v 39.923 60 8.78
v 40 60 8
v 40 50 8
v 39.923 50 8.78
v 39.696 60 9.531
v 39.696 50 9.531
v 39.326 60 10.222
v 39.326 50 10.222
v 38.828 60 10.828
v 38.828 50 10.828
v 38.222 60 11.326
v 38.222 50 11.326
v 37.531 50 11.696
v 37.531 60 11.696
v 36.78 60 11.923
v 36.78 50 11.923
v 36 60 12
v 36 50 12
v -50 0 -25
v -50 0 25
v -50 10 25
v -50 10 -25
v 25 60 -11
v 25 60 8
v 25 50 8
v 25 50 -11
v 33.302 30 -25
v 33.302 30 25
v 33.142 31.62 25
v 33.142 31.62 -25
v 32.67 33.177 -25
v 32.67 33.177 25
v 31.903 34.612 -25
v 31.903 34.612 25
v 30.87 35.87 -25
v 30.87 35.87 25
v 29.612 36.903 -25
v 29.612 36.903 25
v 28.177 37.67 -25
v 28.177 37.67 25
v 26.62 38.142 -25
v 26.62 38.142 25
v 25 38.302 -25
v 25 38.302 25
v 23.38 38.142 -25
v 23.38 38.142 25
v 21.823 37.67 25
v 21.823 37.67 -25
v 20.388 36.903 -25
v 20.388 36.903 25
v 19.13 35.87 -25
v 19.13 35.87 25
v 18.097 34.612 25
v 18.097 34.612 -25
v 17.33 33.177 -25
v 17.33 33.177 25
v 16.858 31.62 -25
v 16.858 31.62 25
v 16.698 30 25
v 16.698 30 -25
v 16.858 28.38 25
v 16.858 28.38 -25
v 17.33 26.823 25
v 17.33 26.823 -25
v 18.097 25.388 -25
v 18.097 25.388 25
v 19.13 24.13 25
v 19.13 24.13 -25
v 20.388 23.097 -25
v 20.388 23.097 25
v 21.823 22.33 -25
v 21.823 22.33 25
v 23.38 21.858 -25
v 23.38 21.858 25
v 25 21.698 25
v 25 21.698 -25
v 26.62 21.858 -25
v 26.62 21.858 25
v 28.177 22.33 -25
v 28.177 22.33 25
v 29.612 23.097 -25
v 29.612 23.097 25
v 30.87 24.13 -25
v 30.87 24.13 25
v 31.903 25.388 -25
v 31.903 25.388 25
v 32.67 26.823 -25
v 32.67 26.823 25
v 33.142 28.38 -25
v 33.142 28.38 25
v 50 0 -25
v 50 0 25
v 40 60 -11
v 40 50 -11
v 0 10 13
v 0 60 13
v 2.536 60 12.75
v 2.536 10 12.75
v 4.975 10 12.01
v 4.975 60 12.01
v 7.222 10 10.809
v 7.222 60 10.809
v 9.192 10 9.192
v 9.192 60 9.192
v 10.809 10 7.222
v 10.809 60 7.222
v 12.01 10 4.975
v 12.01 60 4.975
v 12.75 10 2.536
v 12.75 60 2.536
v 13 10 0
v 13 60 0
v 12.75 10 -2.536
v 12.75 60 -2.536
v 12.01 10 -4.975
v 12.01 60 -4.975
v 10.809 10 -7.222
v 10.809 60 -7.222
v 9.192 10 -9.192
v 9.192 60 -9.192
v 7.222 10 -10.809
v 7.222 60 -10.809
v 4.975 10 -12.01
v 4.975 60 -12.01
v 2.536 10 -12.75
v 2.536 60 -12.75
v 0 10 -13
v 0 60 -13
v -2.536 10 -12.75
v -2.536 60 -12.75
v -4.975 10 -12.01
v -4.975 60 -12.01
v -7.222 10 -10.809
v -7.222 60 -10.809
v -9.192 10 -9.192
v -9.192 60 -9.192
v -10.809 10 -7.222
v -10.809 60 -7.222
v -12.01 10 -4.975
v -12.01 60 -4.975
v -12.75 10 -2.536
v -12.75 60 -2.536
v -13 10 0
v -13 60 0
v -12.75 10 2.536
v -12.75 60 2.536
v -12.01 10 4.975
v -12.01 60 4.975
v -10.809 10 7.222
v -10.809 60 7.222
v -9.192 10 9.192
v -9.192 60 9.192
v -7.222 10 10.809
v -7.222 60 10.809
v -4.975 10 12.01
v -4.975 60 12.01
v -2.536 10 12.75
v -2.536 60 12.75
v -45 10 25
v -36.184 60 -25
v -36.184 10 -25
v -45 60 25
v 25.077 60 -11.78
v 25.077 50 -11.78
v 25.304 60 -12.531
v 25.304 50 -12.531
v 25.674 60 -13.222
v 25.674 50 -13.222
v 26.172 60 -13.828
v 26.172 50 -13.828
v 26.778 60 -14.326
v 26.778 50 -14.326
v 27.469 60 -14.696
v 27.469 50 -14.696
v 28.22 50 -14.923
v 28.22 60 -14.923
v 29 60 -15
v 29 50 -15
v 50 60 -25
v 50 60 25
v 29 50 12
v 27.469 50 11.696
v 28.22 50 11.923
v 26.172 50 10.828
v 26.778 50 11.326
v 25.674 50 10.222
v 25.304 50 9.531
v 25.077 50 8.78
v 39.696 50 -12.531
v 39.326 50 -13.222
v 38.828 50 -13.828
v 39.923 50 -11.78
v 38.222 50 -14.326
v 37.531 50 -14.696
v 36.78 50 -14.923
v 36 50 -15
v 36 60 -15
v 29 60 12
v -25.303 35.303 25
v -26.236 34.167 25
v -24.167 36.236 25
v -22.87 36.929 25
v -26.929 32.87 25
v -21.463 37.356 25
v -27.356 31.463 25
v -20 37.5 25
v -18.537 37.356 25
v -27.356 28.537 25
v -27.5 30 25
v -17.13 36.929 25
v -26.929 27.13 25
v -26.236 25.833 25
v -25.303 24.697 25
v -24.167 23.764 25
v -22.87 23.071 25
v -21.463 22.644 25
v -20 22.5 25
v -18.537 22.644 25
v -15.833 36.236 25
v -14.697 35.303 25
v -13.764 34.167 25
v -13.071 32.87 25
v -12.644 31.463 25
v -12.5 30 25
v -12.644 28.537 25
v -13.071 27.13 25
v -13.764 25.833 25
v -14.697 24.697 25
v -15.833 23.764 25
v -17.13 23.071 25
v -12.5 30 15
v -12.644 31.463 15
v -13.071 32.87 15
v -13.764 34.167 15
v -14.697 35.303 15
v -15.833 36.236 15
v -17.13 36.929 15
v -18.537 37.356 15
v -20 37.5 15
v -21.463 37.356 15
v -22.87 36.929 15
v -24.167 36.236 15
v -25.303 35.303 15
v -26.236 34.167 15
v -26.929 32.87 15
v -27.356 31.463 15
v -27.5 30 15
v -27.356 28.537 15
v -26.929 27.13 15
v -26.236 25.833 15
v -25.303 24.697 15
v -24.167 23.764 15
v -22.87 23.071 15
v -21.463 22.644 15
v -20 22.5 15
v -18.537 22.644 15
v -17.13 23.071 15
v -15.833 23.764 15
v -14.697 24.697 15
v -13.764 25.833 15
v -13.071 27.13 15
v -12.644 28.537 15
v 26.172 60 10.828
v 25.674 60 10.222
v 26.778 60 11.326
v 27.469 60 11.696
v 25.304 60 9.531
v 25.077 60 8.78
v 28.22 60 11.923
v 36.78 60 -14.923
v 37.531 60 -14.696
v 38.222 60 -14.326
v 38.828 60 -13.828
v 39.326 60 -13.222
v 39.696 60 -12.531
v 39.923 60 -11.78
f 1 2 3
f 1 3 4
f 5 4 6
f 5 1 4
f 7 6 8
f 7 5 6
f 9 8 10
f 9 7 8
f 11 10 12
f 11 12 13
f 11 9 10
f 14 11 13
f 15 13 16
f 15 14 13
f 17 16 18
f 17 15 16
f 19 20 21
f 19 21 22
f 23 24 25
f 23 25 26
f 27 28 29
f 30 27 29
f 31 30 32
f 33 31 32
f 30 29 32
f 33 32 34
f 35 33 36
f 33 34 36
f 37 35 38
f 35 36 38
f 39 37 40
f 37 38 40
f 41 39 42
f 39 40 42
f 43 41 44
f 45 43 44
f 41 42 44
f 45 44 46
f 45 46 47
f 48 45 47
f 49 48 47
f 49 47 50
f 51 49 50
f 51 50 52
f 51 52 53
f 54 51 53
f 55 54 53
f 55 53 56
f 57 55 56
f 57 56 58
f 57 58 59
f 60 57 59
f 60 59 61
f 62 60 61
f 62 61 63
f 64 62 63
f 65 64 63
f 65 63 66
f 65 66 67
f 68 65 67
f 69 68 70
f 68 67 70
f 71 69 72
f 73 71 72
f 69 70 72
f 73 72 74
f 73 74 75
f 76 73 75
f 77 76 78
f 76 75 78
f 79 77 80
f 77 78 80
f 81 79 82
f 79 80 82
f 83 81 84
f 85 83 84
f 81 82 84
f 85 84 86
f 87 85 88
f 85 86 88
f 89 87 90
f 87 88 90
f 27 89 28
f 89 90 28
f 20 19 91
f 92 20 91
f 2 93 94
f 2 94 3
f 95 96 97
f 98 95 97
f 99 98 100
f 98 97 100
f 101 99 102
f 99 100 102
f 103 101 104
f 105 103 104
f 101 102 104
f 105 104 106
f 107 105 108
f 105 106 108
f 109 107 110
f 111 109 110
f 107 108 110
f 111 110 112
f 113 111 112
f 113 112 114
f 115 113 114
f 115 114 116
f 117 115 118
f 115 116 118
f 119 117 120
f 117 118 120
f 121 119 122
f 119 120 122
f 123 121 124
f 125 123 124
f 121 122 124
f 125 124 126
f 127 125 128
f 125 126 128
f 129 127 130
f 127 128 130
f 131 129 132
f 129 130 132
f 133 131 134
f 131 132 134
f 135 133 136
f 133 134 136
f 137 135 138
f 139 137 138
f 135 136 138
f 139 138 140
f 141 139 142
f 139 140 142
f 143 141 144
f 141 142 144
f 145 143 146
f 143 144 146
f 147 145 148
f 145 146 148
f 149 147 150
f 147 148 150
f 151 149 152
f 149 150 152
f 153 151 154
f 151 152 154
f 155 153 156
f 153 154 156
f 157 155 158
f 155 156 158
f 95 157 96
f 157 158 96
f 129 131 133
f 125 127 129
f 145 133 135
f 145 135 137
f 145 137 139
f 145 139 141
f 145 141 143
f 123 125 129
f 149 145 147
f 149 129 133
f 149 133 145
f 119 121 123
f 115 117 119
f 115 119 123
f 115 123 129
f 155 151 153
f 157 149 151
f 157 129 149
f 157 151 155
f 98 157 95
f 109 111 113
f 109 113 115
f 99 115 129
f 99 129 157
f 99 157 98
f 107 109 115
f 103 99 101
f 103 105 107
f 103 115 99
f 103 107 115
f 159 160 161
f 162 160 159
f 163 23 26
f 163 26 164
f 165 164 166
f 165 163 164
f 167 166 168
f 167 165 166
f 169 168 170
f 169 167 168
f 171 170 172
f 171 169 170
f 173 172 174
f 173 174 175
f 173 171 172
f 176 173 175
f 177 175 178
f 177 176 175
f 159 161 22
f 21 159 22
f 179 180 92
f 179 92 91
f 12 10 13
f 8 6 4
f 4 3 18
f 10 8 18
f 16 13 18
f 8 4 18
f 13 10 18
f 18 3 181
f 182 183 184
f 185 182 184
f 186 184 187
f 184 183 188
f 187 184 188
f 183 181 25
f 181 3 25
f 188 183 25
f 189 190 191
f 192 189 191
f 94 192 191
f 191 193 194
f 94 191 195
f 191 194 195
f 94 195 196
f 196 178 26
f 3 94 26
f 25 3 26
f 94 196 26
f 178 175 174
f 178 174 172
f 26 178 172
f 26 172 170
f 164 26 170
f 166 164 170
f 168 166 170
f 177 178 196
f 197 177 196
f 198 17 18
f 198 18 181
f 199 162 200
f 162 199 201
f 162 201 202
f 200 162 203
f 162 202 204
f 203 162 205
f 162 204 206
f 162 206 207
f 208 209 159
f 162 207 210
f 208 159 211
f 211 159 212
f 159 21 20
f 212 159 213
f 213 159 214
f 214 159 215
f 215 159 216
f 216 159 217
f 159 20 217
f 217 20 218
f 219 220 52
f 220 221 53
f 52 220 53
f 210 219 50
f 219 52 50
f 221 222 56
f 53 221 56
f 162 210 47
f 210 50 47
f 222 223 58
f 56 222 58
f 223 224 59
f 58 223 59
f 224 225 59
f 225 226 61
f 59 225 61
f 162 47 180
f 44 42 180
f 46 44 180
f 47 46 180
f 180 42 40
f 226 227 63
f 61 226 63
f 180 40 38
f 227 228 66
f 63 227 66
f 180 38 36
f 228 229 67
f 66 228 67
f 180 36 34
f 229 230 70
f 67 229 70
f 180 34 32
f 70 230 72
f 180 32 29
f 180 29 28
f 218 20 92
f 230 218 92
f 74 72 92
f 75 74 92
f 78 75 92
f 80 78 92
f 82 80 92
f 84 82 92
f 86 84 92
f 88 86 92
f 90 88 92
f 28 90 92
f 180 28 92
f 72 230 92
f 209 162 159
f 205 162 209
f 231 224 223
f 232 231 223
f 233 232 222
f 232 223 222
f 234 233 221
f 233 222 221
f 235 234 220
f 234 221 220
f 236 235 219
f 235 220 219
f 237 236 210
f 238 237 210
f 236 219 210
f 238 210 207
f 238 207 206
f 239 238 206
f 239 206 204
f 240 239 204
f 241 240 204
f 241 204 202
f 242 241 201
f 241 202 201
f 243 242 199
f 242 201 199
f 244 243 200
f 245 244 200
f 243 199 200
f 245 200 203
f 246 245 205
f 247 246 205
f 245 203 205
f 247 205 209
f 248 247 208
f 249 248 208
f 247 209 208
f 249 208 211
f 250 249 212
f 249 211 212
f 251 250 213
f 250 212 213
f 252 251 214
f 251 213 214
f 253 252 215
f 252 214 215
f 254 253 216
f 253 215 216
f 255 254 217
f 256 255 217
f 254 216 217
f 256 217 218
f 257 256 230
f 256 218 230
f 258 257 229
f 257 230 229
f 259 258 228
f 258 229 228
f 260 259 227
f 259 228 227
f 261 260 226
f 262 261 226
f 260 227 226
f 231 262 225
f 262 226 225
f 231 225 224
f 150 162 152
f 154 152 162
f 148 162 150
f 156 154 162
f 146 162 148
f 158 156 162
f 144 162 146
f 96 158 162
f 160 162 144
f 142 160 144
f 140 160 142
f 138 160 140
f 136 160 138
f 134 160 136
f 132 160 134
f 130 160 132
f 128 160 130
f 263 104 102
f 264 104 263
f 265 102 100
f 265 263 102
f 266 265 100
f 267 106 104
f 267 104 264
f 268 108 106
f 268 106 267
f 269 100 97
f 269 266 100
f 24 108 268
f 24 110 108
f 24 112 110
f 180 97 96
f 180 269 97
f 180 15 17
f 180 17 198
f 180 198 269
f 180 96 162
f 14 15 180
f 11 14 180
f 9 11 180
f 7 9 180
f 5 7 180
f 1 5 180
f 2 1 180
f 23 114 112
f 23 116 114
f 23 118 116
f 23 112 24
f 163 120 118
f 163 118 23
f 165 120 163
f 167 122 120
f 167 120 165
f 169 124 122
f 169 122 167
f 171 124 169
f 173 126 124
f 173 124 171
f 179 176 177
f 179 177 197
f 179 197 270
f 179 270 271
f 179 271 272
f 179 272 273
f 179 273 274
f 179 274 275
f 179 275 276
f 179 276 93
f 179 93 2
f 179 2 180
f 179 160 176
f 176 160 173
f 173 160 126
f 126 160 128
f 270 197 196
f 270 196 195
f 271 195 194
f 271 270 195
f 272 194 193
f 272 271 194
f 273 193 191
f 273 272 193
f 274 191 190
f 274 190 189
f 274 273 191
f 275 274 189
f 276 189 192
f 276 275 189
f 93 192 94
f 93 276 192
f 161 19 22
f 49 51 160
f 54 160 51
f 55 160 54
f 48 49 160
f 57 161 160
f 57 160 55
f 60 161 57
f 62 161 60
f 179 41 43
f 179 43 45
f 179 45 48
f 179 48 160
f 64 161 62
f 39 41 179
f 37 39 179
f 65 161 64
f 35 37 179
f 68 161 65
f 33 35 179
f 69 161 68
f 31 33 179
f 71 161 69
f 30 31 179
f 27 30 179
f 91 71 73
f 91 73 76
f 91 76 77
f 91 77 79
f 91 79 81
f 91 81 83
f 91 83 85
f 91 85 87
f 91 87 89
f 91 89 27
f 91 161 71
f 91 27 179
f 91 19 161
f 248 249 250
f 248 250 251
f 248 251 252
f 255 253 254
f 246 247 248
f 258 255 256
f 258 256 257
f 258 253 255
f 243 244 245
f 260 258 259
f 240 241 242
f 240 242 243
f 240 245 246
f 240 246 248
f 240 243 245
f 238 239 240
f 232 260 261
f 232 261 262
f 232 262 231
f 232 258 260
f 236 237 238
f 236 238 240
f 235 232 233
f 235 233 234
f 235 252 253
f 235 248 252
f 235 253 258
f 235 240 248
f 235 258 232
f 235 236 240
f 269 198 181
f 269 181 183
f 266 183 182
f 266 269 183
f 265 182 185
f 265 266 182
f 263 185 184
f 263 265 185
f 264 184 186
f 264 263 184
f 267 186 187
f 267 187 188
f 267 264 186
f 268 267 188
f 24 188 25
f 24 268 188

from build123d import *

# Parameters (mm, degrees)
SKETCH1_W           = 100
SKETCH1_H           = 50
BOSS_EXTRUDE1_DEPTH = 60
CUT_EXTRUDE1_DEPTH  = 50
SKETCH3_R           = 13
CUT_EXTRUDE2_DEPTH  = 50
SKETCH4_R           = 8.30196488
CUT_EXTRUDE3_DEPTH  = 93.736184955
CUT_EXTRUDE4_DEPTH  = 10
SKETCH7_R           = 7.5
CUT_EXTRUDE5_DEPTH  = 10


with BuildPart() as part:
    # Sketch1 → Boss-Extrude1 (new body)
    with BuildSketch(Plane(origin=(0, 0, 0), x_dir=(1, 0, 0), z_dir=(0, 1, 0))):
        Rectangle(SKETCH1_W, SKETCH1_H)
    extrude(amount=BOSS_EXTRUDE1_DEPTH)

    # Sketch2 → Cut-Extrude1 (cut)
    with BuildSketch(Plane(origin=(0, 60, 0), x_dir=(1, 0, 0), z_dir=(0, 1, 0))):
        Polygon((-50, 25), (-36.183650965, 25), (-45, -25), (-50, -25), align=None)
    extrude(amount=-CUT_EXTRUDE1_DEPTH, mode=Mode.SUBTRACT)

    # Sketch3 → Cut-Extrude2 (cut)
    with BuildSketch(Plane(origin=(0, 60, 0), x_dir=(1, 0, 0), z_dir=(0, 1, 0))):
        with Locations(Location((0, 0, 0), (0, 0, 270))):
            Circle(SKETCH3_R)
    extrude(amount=-CUT_EXTRUDE2_DEPTH, mode=Mode.SUBTRACT)

    # Sketch4 → Cut-Extrude3 (cut, through all)
    with BuildSketch(Plane.XY.offset(25)):
        with Locations((25, 30)):
            Circle(SKETCH4_R)
    extrude(amount=-CUT_EXTRUDE3_DEPTH, mode=Mode.SUBTRACT)

    # Sketch6 → Cut-Extrude4 (cut)
    with BuildSketch(Plane(origin=(0, 60, 0), x_dir=(1, 0, 0), z_dir=(0, 1, 0))):
        with BuildLine():
            Line((29, 15), (36, 15))
            ThreePointArc((36, 15), (38.828427125, 13.828427125), (40, 11))
            Line((40, 11), (40, -8))
            ThreePointArc((40, -8), (38.828427125, -10.828427125), (36, -12))
            Line((36, -12), (29, -12))
            ThreePointArc((29, -12), (26.171572875, -10.828427125), (25, -8))
            Line((25, -8), (25, 11))
            ThreePointArc((25, 11), (26.171572875, 13.828427125), (29, 15))
        make_face()
    extrude(amount=-CUT_EXTRUDE4_DEPTH, mode=Mode.SUBTRACT)

    # Sketch7 → Cut-Extrude5 (cut)
    with BuildSketch(Plane.XY.offset(25)):
        with Locations((-20, 30)):
            Circle(SKETCH7_R)
    extrude(amount=-CUT_EXTRUDE5_DEPTH, mode=Mode.SUBTRACT)


solid = part.part
